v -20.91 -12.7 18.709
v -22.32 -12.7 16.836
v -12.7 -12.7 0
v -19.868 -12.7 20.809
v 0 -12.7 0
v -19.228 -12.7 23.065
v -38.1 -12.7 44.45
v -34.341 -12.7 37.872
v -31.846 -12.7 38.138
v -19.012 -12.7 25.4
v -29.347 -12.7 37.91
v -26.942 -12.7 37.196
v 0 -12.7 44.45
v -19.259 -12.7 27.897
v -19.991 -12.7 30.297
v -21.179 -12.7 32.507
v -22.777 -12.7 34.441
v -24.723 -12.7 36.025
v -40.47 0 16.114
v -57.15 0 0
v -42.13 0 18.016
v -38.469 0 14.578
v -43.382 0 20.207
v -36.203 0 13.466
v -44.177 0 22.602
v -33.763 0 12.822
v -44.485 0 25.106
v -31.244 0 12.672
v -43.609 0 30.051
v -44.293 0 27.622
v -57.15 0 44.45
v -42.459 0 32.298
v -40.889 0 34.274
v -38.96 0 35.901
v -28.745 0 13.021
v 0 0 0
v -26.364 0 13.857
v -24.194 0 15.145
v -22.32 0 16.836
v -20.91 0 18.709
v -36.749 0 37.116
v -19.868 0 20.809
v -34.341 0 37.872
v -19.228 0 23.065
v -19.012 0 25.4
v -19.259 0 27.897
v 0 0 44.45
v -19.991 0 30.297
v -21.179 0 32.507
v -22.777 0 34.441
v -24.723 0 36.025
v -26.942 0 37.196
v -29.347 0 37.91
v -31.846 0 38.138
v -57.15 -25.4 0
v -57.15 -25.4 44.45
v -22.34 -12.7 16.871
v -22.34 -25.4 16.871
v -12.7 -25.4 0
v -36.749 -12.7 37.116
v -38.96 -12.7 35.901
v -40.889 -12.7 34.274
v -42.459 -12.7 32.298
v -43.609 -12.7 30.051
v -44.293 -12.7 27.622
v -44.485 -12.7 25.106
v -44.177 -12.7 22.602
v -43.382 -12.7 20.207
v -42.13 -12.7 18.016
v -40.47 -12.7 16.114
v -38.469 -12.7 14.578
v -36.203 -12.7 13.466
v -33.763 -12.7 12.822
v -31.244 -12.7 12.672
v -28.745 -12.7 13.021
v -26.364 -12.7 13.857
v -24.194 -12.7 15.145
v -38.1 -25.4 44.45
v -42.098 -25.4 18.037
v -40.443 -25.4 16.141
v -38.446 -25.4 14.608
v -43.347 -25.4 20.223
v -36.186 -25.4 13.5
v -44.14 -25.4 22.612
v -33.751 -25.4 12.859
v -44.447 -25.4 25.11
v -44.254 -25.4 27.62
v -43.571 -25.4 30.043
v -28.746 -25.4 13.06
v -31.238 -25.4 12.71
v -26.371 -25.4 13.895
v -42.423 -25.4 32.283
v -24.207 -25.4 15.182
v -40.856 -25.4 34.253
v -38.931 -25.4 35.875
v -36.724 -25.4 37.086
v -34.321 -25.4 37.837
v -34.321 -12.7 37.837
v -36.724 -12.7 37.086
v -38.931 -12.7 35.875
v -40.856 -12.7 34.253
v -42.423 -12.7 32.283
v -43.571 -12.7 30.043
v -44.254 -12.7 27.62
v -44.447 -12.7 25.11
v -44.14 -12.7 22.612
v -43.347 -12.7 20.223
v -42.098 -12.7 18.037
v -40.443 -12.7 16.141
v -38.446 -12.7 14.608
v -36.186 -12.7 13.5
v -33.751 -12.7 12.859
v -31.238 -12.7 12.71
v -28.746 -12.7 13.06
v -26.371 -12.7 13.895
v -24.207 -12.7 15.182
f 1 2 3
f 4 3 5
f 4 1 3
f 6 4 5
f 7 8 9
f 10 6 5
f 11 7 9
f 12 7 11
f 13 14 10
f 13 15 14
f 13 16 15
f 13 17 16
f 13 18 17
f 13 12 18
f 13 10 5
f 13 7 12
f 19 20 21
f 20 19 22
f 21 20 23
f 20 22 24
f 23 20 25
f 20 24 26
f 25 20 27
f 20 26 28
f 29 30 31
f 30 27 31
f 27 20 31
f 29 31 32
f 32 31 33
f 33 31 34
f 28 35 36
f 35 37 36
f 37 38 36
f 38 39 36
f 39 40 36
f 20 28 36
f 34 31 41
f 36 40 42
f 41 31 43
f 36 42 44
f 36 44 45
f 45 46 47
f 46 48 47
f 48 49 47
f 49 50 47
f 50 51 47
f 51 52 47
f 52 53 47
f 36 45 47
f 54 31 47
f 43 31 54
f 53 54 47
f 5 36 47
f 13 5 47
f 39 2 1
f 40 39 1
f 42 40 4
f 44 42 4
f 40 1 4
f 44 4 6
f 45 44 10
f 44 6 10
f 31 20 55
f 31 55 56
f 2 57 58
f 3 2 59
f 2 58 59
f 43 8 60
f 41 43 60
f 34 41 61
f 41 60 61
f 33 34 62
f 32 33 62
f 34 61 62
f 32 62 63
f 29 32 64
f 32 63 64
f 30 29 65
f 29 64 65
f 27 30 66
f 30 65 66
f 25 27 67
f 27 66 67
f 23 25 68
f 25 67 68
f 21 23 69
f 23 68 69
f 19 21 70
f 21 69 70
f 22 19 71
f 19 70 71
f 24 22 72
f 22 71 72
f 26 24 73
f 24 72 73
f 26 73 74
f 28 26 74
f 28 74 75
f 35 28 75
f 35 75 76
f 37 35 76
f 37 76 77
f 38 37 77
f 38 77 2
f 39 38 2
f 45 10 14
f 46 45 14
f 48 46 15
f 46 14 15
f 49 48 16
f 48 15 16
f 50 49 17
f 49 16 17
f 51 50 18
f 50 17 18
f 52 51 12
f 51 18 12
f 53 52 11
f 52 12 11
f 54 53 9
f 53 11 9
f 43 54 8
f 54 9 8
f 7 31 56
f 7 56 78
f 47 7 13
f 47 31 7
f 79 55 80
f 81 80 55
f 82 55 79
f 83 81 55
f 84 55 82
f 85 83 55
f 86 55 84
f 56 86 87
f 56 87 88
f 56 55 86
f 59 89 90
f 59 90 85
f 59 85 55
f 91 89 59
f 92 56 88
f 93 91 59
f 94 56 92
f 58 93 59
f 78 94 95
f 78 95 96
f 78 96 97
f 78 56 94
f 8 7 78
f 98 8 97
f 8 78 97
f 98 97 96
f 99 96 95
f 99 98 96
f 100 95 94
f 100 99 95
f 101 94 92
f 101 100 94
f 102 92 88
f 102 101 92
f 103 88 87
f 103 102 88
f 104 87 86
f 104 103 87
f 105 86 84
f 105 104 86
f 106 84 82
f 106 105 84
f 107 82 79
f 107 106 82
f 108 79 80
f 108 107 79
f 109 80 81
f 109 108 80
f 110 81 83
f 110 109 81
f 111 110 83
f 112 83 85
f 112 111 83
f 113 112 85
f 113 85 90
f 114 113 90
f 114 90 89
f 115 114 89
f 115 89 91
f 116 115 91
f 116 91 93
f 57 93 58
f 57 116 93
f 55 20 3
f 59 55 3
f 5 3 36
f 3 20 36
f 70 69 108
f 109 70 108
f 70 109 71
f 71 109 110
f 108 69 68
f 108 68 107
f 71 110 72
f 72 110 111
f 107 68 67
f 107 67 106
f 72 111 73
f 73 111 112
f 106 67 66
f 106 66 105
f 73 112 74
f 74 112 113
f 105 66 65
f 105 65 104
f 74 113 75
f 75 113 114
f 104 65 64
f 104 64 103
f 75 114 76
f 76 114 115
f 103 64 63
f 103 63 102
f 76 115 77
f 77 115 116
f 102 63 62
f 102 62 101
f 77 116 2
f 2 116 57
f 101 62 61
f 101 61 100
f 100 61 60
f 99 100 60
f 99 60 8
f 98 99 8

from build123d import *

# Parameters (mm, degrees)
F0_W     = 57.15
F0_H     = 44.45
F1_DEPTH = 25.4
F3_DEPTH = 12.7
F4_R     = 12.7
F5_DEPTH = 12.701
F7_DEPTH = 25.4


with BuildPart() as f1:
    # F0 (on Front) → F1 (new body)
    with BuildSketch(Plane.XZ):
        with Locations((-28.575, 22.225)):
            Rectangle(F0_W, F0_H)
    extrude(amount=F1_DEPTH)

    # F2 (on face) → F3 (cut)
    with BuildSketch(Plane.XZ.offset(25.4)):
        Polygon((0, 44.45), (-38.1, 44.45), (-12.7, 0), (0, 0), align=None)
    extrude(amount=-F3_DEPTH, mode=Mode.SUBTRACT)

    # F4 (on face) → F5 (cut, through all)
    with BuildSketch(Plane.XZ.offset(12.7)):
        with Locations((-31.75, 25.4)):
            Circle(F4_R)
    extrude(amount=F5_DEPTH, mode=Mode.SUBTRACT)

    # F6 (on face) → F7 (cut)
    with BuildSketch(Plane.XZ.offset(12.7)):
        with BuildLine():
            Line((-34.321148, 37.837009), (-34.341116, 37.871952))
            ThreePointArc((-34.341116, 37.871952), (-42.809914, 19.080049), (-22.320423, 16.83574))
            Line((-22.320423, 16.83574), (-22.34039, 16.870683))
            ThreePointArc((-22.34039, 16.870683), (-42.776688, 19.099035), (-34.321148, 37.837009))
        make_face()
        with BuildLine():
            ThreePointArc((-22.320423, 16.83574), (-19.867661, 20.809412), (-19.011732, 25.4))
            ThreePointArc((-19.011732, 25.4), (-23.71081, 35.281037), (-34.341116, 37.871952))
            Line((-34.341116, 37.871952), (-34.321148, 37.837009))
            ThreePointArc((-34.321148, 37.837009), (-42.776688, 19.099035), (-22.34039, 16.870683))
            Line((-22.34039, 16.870683), (-22.320423, 16.83574))
        make_face()
    extrude(amount=-F7_DEPTH, mode=Mode.SUBTRACT)


solid = f1.part
